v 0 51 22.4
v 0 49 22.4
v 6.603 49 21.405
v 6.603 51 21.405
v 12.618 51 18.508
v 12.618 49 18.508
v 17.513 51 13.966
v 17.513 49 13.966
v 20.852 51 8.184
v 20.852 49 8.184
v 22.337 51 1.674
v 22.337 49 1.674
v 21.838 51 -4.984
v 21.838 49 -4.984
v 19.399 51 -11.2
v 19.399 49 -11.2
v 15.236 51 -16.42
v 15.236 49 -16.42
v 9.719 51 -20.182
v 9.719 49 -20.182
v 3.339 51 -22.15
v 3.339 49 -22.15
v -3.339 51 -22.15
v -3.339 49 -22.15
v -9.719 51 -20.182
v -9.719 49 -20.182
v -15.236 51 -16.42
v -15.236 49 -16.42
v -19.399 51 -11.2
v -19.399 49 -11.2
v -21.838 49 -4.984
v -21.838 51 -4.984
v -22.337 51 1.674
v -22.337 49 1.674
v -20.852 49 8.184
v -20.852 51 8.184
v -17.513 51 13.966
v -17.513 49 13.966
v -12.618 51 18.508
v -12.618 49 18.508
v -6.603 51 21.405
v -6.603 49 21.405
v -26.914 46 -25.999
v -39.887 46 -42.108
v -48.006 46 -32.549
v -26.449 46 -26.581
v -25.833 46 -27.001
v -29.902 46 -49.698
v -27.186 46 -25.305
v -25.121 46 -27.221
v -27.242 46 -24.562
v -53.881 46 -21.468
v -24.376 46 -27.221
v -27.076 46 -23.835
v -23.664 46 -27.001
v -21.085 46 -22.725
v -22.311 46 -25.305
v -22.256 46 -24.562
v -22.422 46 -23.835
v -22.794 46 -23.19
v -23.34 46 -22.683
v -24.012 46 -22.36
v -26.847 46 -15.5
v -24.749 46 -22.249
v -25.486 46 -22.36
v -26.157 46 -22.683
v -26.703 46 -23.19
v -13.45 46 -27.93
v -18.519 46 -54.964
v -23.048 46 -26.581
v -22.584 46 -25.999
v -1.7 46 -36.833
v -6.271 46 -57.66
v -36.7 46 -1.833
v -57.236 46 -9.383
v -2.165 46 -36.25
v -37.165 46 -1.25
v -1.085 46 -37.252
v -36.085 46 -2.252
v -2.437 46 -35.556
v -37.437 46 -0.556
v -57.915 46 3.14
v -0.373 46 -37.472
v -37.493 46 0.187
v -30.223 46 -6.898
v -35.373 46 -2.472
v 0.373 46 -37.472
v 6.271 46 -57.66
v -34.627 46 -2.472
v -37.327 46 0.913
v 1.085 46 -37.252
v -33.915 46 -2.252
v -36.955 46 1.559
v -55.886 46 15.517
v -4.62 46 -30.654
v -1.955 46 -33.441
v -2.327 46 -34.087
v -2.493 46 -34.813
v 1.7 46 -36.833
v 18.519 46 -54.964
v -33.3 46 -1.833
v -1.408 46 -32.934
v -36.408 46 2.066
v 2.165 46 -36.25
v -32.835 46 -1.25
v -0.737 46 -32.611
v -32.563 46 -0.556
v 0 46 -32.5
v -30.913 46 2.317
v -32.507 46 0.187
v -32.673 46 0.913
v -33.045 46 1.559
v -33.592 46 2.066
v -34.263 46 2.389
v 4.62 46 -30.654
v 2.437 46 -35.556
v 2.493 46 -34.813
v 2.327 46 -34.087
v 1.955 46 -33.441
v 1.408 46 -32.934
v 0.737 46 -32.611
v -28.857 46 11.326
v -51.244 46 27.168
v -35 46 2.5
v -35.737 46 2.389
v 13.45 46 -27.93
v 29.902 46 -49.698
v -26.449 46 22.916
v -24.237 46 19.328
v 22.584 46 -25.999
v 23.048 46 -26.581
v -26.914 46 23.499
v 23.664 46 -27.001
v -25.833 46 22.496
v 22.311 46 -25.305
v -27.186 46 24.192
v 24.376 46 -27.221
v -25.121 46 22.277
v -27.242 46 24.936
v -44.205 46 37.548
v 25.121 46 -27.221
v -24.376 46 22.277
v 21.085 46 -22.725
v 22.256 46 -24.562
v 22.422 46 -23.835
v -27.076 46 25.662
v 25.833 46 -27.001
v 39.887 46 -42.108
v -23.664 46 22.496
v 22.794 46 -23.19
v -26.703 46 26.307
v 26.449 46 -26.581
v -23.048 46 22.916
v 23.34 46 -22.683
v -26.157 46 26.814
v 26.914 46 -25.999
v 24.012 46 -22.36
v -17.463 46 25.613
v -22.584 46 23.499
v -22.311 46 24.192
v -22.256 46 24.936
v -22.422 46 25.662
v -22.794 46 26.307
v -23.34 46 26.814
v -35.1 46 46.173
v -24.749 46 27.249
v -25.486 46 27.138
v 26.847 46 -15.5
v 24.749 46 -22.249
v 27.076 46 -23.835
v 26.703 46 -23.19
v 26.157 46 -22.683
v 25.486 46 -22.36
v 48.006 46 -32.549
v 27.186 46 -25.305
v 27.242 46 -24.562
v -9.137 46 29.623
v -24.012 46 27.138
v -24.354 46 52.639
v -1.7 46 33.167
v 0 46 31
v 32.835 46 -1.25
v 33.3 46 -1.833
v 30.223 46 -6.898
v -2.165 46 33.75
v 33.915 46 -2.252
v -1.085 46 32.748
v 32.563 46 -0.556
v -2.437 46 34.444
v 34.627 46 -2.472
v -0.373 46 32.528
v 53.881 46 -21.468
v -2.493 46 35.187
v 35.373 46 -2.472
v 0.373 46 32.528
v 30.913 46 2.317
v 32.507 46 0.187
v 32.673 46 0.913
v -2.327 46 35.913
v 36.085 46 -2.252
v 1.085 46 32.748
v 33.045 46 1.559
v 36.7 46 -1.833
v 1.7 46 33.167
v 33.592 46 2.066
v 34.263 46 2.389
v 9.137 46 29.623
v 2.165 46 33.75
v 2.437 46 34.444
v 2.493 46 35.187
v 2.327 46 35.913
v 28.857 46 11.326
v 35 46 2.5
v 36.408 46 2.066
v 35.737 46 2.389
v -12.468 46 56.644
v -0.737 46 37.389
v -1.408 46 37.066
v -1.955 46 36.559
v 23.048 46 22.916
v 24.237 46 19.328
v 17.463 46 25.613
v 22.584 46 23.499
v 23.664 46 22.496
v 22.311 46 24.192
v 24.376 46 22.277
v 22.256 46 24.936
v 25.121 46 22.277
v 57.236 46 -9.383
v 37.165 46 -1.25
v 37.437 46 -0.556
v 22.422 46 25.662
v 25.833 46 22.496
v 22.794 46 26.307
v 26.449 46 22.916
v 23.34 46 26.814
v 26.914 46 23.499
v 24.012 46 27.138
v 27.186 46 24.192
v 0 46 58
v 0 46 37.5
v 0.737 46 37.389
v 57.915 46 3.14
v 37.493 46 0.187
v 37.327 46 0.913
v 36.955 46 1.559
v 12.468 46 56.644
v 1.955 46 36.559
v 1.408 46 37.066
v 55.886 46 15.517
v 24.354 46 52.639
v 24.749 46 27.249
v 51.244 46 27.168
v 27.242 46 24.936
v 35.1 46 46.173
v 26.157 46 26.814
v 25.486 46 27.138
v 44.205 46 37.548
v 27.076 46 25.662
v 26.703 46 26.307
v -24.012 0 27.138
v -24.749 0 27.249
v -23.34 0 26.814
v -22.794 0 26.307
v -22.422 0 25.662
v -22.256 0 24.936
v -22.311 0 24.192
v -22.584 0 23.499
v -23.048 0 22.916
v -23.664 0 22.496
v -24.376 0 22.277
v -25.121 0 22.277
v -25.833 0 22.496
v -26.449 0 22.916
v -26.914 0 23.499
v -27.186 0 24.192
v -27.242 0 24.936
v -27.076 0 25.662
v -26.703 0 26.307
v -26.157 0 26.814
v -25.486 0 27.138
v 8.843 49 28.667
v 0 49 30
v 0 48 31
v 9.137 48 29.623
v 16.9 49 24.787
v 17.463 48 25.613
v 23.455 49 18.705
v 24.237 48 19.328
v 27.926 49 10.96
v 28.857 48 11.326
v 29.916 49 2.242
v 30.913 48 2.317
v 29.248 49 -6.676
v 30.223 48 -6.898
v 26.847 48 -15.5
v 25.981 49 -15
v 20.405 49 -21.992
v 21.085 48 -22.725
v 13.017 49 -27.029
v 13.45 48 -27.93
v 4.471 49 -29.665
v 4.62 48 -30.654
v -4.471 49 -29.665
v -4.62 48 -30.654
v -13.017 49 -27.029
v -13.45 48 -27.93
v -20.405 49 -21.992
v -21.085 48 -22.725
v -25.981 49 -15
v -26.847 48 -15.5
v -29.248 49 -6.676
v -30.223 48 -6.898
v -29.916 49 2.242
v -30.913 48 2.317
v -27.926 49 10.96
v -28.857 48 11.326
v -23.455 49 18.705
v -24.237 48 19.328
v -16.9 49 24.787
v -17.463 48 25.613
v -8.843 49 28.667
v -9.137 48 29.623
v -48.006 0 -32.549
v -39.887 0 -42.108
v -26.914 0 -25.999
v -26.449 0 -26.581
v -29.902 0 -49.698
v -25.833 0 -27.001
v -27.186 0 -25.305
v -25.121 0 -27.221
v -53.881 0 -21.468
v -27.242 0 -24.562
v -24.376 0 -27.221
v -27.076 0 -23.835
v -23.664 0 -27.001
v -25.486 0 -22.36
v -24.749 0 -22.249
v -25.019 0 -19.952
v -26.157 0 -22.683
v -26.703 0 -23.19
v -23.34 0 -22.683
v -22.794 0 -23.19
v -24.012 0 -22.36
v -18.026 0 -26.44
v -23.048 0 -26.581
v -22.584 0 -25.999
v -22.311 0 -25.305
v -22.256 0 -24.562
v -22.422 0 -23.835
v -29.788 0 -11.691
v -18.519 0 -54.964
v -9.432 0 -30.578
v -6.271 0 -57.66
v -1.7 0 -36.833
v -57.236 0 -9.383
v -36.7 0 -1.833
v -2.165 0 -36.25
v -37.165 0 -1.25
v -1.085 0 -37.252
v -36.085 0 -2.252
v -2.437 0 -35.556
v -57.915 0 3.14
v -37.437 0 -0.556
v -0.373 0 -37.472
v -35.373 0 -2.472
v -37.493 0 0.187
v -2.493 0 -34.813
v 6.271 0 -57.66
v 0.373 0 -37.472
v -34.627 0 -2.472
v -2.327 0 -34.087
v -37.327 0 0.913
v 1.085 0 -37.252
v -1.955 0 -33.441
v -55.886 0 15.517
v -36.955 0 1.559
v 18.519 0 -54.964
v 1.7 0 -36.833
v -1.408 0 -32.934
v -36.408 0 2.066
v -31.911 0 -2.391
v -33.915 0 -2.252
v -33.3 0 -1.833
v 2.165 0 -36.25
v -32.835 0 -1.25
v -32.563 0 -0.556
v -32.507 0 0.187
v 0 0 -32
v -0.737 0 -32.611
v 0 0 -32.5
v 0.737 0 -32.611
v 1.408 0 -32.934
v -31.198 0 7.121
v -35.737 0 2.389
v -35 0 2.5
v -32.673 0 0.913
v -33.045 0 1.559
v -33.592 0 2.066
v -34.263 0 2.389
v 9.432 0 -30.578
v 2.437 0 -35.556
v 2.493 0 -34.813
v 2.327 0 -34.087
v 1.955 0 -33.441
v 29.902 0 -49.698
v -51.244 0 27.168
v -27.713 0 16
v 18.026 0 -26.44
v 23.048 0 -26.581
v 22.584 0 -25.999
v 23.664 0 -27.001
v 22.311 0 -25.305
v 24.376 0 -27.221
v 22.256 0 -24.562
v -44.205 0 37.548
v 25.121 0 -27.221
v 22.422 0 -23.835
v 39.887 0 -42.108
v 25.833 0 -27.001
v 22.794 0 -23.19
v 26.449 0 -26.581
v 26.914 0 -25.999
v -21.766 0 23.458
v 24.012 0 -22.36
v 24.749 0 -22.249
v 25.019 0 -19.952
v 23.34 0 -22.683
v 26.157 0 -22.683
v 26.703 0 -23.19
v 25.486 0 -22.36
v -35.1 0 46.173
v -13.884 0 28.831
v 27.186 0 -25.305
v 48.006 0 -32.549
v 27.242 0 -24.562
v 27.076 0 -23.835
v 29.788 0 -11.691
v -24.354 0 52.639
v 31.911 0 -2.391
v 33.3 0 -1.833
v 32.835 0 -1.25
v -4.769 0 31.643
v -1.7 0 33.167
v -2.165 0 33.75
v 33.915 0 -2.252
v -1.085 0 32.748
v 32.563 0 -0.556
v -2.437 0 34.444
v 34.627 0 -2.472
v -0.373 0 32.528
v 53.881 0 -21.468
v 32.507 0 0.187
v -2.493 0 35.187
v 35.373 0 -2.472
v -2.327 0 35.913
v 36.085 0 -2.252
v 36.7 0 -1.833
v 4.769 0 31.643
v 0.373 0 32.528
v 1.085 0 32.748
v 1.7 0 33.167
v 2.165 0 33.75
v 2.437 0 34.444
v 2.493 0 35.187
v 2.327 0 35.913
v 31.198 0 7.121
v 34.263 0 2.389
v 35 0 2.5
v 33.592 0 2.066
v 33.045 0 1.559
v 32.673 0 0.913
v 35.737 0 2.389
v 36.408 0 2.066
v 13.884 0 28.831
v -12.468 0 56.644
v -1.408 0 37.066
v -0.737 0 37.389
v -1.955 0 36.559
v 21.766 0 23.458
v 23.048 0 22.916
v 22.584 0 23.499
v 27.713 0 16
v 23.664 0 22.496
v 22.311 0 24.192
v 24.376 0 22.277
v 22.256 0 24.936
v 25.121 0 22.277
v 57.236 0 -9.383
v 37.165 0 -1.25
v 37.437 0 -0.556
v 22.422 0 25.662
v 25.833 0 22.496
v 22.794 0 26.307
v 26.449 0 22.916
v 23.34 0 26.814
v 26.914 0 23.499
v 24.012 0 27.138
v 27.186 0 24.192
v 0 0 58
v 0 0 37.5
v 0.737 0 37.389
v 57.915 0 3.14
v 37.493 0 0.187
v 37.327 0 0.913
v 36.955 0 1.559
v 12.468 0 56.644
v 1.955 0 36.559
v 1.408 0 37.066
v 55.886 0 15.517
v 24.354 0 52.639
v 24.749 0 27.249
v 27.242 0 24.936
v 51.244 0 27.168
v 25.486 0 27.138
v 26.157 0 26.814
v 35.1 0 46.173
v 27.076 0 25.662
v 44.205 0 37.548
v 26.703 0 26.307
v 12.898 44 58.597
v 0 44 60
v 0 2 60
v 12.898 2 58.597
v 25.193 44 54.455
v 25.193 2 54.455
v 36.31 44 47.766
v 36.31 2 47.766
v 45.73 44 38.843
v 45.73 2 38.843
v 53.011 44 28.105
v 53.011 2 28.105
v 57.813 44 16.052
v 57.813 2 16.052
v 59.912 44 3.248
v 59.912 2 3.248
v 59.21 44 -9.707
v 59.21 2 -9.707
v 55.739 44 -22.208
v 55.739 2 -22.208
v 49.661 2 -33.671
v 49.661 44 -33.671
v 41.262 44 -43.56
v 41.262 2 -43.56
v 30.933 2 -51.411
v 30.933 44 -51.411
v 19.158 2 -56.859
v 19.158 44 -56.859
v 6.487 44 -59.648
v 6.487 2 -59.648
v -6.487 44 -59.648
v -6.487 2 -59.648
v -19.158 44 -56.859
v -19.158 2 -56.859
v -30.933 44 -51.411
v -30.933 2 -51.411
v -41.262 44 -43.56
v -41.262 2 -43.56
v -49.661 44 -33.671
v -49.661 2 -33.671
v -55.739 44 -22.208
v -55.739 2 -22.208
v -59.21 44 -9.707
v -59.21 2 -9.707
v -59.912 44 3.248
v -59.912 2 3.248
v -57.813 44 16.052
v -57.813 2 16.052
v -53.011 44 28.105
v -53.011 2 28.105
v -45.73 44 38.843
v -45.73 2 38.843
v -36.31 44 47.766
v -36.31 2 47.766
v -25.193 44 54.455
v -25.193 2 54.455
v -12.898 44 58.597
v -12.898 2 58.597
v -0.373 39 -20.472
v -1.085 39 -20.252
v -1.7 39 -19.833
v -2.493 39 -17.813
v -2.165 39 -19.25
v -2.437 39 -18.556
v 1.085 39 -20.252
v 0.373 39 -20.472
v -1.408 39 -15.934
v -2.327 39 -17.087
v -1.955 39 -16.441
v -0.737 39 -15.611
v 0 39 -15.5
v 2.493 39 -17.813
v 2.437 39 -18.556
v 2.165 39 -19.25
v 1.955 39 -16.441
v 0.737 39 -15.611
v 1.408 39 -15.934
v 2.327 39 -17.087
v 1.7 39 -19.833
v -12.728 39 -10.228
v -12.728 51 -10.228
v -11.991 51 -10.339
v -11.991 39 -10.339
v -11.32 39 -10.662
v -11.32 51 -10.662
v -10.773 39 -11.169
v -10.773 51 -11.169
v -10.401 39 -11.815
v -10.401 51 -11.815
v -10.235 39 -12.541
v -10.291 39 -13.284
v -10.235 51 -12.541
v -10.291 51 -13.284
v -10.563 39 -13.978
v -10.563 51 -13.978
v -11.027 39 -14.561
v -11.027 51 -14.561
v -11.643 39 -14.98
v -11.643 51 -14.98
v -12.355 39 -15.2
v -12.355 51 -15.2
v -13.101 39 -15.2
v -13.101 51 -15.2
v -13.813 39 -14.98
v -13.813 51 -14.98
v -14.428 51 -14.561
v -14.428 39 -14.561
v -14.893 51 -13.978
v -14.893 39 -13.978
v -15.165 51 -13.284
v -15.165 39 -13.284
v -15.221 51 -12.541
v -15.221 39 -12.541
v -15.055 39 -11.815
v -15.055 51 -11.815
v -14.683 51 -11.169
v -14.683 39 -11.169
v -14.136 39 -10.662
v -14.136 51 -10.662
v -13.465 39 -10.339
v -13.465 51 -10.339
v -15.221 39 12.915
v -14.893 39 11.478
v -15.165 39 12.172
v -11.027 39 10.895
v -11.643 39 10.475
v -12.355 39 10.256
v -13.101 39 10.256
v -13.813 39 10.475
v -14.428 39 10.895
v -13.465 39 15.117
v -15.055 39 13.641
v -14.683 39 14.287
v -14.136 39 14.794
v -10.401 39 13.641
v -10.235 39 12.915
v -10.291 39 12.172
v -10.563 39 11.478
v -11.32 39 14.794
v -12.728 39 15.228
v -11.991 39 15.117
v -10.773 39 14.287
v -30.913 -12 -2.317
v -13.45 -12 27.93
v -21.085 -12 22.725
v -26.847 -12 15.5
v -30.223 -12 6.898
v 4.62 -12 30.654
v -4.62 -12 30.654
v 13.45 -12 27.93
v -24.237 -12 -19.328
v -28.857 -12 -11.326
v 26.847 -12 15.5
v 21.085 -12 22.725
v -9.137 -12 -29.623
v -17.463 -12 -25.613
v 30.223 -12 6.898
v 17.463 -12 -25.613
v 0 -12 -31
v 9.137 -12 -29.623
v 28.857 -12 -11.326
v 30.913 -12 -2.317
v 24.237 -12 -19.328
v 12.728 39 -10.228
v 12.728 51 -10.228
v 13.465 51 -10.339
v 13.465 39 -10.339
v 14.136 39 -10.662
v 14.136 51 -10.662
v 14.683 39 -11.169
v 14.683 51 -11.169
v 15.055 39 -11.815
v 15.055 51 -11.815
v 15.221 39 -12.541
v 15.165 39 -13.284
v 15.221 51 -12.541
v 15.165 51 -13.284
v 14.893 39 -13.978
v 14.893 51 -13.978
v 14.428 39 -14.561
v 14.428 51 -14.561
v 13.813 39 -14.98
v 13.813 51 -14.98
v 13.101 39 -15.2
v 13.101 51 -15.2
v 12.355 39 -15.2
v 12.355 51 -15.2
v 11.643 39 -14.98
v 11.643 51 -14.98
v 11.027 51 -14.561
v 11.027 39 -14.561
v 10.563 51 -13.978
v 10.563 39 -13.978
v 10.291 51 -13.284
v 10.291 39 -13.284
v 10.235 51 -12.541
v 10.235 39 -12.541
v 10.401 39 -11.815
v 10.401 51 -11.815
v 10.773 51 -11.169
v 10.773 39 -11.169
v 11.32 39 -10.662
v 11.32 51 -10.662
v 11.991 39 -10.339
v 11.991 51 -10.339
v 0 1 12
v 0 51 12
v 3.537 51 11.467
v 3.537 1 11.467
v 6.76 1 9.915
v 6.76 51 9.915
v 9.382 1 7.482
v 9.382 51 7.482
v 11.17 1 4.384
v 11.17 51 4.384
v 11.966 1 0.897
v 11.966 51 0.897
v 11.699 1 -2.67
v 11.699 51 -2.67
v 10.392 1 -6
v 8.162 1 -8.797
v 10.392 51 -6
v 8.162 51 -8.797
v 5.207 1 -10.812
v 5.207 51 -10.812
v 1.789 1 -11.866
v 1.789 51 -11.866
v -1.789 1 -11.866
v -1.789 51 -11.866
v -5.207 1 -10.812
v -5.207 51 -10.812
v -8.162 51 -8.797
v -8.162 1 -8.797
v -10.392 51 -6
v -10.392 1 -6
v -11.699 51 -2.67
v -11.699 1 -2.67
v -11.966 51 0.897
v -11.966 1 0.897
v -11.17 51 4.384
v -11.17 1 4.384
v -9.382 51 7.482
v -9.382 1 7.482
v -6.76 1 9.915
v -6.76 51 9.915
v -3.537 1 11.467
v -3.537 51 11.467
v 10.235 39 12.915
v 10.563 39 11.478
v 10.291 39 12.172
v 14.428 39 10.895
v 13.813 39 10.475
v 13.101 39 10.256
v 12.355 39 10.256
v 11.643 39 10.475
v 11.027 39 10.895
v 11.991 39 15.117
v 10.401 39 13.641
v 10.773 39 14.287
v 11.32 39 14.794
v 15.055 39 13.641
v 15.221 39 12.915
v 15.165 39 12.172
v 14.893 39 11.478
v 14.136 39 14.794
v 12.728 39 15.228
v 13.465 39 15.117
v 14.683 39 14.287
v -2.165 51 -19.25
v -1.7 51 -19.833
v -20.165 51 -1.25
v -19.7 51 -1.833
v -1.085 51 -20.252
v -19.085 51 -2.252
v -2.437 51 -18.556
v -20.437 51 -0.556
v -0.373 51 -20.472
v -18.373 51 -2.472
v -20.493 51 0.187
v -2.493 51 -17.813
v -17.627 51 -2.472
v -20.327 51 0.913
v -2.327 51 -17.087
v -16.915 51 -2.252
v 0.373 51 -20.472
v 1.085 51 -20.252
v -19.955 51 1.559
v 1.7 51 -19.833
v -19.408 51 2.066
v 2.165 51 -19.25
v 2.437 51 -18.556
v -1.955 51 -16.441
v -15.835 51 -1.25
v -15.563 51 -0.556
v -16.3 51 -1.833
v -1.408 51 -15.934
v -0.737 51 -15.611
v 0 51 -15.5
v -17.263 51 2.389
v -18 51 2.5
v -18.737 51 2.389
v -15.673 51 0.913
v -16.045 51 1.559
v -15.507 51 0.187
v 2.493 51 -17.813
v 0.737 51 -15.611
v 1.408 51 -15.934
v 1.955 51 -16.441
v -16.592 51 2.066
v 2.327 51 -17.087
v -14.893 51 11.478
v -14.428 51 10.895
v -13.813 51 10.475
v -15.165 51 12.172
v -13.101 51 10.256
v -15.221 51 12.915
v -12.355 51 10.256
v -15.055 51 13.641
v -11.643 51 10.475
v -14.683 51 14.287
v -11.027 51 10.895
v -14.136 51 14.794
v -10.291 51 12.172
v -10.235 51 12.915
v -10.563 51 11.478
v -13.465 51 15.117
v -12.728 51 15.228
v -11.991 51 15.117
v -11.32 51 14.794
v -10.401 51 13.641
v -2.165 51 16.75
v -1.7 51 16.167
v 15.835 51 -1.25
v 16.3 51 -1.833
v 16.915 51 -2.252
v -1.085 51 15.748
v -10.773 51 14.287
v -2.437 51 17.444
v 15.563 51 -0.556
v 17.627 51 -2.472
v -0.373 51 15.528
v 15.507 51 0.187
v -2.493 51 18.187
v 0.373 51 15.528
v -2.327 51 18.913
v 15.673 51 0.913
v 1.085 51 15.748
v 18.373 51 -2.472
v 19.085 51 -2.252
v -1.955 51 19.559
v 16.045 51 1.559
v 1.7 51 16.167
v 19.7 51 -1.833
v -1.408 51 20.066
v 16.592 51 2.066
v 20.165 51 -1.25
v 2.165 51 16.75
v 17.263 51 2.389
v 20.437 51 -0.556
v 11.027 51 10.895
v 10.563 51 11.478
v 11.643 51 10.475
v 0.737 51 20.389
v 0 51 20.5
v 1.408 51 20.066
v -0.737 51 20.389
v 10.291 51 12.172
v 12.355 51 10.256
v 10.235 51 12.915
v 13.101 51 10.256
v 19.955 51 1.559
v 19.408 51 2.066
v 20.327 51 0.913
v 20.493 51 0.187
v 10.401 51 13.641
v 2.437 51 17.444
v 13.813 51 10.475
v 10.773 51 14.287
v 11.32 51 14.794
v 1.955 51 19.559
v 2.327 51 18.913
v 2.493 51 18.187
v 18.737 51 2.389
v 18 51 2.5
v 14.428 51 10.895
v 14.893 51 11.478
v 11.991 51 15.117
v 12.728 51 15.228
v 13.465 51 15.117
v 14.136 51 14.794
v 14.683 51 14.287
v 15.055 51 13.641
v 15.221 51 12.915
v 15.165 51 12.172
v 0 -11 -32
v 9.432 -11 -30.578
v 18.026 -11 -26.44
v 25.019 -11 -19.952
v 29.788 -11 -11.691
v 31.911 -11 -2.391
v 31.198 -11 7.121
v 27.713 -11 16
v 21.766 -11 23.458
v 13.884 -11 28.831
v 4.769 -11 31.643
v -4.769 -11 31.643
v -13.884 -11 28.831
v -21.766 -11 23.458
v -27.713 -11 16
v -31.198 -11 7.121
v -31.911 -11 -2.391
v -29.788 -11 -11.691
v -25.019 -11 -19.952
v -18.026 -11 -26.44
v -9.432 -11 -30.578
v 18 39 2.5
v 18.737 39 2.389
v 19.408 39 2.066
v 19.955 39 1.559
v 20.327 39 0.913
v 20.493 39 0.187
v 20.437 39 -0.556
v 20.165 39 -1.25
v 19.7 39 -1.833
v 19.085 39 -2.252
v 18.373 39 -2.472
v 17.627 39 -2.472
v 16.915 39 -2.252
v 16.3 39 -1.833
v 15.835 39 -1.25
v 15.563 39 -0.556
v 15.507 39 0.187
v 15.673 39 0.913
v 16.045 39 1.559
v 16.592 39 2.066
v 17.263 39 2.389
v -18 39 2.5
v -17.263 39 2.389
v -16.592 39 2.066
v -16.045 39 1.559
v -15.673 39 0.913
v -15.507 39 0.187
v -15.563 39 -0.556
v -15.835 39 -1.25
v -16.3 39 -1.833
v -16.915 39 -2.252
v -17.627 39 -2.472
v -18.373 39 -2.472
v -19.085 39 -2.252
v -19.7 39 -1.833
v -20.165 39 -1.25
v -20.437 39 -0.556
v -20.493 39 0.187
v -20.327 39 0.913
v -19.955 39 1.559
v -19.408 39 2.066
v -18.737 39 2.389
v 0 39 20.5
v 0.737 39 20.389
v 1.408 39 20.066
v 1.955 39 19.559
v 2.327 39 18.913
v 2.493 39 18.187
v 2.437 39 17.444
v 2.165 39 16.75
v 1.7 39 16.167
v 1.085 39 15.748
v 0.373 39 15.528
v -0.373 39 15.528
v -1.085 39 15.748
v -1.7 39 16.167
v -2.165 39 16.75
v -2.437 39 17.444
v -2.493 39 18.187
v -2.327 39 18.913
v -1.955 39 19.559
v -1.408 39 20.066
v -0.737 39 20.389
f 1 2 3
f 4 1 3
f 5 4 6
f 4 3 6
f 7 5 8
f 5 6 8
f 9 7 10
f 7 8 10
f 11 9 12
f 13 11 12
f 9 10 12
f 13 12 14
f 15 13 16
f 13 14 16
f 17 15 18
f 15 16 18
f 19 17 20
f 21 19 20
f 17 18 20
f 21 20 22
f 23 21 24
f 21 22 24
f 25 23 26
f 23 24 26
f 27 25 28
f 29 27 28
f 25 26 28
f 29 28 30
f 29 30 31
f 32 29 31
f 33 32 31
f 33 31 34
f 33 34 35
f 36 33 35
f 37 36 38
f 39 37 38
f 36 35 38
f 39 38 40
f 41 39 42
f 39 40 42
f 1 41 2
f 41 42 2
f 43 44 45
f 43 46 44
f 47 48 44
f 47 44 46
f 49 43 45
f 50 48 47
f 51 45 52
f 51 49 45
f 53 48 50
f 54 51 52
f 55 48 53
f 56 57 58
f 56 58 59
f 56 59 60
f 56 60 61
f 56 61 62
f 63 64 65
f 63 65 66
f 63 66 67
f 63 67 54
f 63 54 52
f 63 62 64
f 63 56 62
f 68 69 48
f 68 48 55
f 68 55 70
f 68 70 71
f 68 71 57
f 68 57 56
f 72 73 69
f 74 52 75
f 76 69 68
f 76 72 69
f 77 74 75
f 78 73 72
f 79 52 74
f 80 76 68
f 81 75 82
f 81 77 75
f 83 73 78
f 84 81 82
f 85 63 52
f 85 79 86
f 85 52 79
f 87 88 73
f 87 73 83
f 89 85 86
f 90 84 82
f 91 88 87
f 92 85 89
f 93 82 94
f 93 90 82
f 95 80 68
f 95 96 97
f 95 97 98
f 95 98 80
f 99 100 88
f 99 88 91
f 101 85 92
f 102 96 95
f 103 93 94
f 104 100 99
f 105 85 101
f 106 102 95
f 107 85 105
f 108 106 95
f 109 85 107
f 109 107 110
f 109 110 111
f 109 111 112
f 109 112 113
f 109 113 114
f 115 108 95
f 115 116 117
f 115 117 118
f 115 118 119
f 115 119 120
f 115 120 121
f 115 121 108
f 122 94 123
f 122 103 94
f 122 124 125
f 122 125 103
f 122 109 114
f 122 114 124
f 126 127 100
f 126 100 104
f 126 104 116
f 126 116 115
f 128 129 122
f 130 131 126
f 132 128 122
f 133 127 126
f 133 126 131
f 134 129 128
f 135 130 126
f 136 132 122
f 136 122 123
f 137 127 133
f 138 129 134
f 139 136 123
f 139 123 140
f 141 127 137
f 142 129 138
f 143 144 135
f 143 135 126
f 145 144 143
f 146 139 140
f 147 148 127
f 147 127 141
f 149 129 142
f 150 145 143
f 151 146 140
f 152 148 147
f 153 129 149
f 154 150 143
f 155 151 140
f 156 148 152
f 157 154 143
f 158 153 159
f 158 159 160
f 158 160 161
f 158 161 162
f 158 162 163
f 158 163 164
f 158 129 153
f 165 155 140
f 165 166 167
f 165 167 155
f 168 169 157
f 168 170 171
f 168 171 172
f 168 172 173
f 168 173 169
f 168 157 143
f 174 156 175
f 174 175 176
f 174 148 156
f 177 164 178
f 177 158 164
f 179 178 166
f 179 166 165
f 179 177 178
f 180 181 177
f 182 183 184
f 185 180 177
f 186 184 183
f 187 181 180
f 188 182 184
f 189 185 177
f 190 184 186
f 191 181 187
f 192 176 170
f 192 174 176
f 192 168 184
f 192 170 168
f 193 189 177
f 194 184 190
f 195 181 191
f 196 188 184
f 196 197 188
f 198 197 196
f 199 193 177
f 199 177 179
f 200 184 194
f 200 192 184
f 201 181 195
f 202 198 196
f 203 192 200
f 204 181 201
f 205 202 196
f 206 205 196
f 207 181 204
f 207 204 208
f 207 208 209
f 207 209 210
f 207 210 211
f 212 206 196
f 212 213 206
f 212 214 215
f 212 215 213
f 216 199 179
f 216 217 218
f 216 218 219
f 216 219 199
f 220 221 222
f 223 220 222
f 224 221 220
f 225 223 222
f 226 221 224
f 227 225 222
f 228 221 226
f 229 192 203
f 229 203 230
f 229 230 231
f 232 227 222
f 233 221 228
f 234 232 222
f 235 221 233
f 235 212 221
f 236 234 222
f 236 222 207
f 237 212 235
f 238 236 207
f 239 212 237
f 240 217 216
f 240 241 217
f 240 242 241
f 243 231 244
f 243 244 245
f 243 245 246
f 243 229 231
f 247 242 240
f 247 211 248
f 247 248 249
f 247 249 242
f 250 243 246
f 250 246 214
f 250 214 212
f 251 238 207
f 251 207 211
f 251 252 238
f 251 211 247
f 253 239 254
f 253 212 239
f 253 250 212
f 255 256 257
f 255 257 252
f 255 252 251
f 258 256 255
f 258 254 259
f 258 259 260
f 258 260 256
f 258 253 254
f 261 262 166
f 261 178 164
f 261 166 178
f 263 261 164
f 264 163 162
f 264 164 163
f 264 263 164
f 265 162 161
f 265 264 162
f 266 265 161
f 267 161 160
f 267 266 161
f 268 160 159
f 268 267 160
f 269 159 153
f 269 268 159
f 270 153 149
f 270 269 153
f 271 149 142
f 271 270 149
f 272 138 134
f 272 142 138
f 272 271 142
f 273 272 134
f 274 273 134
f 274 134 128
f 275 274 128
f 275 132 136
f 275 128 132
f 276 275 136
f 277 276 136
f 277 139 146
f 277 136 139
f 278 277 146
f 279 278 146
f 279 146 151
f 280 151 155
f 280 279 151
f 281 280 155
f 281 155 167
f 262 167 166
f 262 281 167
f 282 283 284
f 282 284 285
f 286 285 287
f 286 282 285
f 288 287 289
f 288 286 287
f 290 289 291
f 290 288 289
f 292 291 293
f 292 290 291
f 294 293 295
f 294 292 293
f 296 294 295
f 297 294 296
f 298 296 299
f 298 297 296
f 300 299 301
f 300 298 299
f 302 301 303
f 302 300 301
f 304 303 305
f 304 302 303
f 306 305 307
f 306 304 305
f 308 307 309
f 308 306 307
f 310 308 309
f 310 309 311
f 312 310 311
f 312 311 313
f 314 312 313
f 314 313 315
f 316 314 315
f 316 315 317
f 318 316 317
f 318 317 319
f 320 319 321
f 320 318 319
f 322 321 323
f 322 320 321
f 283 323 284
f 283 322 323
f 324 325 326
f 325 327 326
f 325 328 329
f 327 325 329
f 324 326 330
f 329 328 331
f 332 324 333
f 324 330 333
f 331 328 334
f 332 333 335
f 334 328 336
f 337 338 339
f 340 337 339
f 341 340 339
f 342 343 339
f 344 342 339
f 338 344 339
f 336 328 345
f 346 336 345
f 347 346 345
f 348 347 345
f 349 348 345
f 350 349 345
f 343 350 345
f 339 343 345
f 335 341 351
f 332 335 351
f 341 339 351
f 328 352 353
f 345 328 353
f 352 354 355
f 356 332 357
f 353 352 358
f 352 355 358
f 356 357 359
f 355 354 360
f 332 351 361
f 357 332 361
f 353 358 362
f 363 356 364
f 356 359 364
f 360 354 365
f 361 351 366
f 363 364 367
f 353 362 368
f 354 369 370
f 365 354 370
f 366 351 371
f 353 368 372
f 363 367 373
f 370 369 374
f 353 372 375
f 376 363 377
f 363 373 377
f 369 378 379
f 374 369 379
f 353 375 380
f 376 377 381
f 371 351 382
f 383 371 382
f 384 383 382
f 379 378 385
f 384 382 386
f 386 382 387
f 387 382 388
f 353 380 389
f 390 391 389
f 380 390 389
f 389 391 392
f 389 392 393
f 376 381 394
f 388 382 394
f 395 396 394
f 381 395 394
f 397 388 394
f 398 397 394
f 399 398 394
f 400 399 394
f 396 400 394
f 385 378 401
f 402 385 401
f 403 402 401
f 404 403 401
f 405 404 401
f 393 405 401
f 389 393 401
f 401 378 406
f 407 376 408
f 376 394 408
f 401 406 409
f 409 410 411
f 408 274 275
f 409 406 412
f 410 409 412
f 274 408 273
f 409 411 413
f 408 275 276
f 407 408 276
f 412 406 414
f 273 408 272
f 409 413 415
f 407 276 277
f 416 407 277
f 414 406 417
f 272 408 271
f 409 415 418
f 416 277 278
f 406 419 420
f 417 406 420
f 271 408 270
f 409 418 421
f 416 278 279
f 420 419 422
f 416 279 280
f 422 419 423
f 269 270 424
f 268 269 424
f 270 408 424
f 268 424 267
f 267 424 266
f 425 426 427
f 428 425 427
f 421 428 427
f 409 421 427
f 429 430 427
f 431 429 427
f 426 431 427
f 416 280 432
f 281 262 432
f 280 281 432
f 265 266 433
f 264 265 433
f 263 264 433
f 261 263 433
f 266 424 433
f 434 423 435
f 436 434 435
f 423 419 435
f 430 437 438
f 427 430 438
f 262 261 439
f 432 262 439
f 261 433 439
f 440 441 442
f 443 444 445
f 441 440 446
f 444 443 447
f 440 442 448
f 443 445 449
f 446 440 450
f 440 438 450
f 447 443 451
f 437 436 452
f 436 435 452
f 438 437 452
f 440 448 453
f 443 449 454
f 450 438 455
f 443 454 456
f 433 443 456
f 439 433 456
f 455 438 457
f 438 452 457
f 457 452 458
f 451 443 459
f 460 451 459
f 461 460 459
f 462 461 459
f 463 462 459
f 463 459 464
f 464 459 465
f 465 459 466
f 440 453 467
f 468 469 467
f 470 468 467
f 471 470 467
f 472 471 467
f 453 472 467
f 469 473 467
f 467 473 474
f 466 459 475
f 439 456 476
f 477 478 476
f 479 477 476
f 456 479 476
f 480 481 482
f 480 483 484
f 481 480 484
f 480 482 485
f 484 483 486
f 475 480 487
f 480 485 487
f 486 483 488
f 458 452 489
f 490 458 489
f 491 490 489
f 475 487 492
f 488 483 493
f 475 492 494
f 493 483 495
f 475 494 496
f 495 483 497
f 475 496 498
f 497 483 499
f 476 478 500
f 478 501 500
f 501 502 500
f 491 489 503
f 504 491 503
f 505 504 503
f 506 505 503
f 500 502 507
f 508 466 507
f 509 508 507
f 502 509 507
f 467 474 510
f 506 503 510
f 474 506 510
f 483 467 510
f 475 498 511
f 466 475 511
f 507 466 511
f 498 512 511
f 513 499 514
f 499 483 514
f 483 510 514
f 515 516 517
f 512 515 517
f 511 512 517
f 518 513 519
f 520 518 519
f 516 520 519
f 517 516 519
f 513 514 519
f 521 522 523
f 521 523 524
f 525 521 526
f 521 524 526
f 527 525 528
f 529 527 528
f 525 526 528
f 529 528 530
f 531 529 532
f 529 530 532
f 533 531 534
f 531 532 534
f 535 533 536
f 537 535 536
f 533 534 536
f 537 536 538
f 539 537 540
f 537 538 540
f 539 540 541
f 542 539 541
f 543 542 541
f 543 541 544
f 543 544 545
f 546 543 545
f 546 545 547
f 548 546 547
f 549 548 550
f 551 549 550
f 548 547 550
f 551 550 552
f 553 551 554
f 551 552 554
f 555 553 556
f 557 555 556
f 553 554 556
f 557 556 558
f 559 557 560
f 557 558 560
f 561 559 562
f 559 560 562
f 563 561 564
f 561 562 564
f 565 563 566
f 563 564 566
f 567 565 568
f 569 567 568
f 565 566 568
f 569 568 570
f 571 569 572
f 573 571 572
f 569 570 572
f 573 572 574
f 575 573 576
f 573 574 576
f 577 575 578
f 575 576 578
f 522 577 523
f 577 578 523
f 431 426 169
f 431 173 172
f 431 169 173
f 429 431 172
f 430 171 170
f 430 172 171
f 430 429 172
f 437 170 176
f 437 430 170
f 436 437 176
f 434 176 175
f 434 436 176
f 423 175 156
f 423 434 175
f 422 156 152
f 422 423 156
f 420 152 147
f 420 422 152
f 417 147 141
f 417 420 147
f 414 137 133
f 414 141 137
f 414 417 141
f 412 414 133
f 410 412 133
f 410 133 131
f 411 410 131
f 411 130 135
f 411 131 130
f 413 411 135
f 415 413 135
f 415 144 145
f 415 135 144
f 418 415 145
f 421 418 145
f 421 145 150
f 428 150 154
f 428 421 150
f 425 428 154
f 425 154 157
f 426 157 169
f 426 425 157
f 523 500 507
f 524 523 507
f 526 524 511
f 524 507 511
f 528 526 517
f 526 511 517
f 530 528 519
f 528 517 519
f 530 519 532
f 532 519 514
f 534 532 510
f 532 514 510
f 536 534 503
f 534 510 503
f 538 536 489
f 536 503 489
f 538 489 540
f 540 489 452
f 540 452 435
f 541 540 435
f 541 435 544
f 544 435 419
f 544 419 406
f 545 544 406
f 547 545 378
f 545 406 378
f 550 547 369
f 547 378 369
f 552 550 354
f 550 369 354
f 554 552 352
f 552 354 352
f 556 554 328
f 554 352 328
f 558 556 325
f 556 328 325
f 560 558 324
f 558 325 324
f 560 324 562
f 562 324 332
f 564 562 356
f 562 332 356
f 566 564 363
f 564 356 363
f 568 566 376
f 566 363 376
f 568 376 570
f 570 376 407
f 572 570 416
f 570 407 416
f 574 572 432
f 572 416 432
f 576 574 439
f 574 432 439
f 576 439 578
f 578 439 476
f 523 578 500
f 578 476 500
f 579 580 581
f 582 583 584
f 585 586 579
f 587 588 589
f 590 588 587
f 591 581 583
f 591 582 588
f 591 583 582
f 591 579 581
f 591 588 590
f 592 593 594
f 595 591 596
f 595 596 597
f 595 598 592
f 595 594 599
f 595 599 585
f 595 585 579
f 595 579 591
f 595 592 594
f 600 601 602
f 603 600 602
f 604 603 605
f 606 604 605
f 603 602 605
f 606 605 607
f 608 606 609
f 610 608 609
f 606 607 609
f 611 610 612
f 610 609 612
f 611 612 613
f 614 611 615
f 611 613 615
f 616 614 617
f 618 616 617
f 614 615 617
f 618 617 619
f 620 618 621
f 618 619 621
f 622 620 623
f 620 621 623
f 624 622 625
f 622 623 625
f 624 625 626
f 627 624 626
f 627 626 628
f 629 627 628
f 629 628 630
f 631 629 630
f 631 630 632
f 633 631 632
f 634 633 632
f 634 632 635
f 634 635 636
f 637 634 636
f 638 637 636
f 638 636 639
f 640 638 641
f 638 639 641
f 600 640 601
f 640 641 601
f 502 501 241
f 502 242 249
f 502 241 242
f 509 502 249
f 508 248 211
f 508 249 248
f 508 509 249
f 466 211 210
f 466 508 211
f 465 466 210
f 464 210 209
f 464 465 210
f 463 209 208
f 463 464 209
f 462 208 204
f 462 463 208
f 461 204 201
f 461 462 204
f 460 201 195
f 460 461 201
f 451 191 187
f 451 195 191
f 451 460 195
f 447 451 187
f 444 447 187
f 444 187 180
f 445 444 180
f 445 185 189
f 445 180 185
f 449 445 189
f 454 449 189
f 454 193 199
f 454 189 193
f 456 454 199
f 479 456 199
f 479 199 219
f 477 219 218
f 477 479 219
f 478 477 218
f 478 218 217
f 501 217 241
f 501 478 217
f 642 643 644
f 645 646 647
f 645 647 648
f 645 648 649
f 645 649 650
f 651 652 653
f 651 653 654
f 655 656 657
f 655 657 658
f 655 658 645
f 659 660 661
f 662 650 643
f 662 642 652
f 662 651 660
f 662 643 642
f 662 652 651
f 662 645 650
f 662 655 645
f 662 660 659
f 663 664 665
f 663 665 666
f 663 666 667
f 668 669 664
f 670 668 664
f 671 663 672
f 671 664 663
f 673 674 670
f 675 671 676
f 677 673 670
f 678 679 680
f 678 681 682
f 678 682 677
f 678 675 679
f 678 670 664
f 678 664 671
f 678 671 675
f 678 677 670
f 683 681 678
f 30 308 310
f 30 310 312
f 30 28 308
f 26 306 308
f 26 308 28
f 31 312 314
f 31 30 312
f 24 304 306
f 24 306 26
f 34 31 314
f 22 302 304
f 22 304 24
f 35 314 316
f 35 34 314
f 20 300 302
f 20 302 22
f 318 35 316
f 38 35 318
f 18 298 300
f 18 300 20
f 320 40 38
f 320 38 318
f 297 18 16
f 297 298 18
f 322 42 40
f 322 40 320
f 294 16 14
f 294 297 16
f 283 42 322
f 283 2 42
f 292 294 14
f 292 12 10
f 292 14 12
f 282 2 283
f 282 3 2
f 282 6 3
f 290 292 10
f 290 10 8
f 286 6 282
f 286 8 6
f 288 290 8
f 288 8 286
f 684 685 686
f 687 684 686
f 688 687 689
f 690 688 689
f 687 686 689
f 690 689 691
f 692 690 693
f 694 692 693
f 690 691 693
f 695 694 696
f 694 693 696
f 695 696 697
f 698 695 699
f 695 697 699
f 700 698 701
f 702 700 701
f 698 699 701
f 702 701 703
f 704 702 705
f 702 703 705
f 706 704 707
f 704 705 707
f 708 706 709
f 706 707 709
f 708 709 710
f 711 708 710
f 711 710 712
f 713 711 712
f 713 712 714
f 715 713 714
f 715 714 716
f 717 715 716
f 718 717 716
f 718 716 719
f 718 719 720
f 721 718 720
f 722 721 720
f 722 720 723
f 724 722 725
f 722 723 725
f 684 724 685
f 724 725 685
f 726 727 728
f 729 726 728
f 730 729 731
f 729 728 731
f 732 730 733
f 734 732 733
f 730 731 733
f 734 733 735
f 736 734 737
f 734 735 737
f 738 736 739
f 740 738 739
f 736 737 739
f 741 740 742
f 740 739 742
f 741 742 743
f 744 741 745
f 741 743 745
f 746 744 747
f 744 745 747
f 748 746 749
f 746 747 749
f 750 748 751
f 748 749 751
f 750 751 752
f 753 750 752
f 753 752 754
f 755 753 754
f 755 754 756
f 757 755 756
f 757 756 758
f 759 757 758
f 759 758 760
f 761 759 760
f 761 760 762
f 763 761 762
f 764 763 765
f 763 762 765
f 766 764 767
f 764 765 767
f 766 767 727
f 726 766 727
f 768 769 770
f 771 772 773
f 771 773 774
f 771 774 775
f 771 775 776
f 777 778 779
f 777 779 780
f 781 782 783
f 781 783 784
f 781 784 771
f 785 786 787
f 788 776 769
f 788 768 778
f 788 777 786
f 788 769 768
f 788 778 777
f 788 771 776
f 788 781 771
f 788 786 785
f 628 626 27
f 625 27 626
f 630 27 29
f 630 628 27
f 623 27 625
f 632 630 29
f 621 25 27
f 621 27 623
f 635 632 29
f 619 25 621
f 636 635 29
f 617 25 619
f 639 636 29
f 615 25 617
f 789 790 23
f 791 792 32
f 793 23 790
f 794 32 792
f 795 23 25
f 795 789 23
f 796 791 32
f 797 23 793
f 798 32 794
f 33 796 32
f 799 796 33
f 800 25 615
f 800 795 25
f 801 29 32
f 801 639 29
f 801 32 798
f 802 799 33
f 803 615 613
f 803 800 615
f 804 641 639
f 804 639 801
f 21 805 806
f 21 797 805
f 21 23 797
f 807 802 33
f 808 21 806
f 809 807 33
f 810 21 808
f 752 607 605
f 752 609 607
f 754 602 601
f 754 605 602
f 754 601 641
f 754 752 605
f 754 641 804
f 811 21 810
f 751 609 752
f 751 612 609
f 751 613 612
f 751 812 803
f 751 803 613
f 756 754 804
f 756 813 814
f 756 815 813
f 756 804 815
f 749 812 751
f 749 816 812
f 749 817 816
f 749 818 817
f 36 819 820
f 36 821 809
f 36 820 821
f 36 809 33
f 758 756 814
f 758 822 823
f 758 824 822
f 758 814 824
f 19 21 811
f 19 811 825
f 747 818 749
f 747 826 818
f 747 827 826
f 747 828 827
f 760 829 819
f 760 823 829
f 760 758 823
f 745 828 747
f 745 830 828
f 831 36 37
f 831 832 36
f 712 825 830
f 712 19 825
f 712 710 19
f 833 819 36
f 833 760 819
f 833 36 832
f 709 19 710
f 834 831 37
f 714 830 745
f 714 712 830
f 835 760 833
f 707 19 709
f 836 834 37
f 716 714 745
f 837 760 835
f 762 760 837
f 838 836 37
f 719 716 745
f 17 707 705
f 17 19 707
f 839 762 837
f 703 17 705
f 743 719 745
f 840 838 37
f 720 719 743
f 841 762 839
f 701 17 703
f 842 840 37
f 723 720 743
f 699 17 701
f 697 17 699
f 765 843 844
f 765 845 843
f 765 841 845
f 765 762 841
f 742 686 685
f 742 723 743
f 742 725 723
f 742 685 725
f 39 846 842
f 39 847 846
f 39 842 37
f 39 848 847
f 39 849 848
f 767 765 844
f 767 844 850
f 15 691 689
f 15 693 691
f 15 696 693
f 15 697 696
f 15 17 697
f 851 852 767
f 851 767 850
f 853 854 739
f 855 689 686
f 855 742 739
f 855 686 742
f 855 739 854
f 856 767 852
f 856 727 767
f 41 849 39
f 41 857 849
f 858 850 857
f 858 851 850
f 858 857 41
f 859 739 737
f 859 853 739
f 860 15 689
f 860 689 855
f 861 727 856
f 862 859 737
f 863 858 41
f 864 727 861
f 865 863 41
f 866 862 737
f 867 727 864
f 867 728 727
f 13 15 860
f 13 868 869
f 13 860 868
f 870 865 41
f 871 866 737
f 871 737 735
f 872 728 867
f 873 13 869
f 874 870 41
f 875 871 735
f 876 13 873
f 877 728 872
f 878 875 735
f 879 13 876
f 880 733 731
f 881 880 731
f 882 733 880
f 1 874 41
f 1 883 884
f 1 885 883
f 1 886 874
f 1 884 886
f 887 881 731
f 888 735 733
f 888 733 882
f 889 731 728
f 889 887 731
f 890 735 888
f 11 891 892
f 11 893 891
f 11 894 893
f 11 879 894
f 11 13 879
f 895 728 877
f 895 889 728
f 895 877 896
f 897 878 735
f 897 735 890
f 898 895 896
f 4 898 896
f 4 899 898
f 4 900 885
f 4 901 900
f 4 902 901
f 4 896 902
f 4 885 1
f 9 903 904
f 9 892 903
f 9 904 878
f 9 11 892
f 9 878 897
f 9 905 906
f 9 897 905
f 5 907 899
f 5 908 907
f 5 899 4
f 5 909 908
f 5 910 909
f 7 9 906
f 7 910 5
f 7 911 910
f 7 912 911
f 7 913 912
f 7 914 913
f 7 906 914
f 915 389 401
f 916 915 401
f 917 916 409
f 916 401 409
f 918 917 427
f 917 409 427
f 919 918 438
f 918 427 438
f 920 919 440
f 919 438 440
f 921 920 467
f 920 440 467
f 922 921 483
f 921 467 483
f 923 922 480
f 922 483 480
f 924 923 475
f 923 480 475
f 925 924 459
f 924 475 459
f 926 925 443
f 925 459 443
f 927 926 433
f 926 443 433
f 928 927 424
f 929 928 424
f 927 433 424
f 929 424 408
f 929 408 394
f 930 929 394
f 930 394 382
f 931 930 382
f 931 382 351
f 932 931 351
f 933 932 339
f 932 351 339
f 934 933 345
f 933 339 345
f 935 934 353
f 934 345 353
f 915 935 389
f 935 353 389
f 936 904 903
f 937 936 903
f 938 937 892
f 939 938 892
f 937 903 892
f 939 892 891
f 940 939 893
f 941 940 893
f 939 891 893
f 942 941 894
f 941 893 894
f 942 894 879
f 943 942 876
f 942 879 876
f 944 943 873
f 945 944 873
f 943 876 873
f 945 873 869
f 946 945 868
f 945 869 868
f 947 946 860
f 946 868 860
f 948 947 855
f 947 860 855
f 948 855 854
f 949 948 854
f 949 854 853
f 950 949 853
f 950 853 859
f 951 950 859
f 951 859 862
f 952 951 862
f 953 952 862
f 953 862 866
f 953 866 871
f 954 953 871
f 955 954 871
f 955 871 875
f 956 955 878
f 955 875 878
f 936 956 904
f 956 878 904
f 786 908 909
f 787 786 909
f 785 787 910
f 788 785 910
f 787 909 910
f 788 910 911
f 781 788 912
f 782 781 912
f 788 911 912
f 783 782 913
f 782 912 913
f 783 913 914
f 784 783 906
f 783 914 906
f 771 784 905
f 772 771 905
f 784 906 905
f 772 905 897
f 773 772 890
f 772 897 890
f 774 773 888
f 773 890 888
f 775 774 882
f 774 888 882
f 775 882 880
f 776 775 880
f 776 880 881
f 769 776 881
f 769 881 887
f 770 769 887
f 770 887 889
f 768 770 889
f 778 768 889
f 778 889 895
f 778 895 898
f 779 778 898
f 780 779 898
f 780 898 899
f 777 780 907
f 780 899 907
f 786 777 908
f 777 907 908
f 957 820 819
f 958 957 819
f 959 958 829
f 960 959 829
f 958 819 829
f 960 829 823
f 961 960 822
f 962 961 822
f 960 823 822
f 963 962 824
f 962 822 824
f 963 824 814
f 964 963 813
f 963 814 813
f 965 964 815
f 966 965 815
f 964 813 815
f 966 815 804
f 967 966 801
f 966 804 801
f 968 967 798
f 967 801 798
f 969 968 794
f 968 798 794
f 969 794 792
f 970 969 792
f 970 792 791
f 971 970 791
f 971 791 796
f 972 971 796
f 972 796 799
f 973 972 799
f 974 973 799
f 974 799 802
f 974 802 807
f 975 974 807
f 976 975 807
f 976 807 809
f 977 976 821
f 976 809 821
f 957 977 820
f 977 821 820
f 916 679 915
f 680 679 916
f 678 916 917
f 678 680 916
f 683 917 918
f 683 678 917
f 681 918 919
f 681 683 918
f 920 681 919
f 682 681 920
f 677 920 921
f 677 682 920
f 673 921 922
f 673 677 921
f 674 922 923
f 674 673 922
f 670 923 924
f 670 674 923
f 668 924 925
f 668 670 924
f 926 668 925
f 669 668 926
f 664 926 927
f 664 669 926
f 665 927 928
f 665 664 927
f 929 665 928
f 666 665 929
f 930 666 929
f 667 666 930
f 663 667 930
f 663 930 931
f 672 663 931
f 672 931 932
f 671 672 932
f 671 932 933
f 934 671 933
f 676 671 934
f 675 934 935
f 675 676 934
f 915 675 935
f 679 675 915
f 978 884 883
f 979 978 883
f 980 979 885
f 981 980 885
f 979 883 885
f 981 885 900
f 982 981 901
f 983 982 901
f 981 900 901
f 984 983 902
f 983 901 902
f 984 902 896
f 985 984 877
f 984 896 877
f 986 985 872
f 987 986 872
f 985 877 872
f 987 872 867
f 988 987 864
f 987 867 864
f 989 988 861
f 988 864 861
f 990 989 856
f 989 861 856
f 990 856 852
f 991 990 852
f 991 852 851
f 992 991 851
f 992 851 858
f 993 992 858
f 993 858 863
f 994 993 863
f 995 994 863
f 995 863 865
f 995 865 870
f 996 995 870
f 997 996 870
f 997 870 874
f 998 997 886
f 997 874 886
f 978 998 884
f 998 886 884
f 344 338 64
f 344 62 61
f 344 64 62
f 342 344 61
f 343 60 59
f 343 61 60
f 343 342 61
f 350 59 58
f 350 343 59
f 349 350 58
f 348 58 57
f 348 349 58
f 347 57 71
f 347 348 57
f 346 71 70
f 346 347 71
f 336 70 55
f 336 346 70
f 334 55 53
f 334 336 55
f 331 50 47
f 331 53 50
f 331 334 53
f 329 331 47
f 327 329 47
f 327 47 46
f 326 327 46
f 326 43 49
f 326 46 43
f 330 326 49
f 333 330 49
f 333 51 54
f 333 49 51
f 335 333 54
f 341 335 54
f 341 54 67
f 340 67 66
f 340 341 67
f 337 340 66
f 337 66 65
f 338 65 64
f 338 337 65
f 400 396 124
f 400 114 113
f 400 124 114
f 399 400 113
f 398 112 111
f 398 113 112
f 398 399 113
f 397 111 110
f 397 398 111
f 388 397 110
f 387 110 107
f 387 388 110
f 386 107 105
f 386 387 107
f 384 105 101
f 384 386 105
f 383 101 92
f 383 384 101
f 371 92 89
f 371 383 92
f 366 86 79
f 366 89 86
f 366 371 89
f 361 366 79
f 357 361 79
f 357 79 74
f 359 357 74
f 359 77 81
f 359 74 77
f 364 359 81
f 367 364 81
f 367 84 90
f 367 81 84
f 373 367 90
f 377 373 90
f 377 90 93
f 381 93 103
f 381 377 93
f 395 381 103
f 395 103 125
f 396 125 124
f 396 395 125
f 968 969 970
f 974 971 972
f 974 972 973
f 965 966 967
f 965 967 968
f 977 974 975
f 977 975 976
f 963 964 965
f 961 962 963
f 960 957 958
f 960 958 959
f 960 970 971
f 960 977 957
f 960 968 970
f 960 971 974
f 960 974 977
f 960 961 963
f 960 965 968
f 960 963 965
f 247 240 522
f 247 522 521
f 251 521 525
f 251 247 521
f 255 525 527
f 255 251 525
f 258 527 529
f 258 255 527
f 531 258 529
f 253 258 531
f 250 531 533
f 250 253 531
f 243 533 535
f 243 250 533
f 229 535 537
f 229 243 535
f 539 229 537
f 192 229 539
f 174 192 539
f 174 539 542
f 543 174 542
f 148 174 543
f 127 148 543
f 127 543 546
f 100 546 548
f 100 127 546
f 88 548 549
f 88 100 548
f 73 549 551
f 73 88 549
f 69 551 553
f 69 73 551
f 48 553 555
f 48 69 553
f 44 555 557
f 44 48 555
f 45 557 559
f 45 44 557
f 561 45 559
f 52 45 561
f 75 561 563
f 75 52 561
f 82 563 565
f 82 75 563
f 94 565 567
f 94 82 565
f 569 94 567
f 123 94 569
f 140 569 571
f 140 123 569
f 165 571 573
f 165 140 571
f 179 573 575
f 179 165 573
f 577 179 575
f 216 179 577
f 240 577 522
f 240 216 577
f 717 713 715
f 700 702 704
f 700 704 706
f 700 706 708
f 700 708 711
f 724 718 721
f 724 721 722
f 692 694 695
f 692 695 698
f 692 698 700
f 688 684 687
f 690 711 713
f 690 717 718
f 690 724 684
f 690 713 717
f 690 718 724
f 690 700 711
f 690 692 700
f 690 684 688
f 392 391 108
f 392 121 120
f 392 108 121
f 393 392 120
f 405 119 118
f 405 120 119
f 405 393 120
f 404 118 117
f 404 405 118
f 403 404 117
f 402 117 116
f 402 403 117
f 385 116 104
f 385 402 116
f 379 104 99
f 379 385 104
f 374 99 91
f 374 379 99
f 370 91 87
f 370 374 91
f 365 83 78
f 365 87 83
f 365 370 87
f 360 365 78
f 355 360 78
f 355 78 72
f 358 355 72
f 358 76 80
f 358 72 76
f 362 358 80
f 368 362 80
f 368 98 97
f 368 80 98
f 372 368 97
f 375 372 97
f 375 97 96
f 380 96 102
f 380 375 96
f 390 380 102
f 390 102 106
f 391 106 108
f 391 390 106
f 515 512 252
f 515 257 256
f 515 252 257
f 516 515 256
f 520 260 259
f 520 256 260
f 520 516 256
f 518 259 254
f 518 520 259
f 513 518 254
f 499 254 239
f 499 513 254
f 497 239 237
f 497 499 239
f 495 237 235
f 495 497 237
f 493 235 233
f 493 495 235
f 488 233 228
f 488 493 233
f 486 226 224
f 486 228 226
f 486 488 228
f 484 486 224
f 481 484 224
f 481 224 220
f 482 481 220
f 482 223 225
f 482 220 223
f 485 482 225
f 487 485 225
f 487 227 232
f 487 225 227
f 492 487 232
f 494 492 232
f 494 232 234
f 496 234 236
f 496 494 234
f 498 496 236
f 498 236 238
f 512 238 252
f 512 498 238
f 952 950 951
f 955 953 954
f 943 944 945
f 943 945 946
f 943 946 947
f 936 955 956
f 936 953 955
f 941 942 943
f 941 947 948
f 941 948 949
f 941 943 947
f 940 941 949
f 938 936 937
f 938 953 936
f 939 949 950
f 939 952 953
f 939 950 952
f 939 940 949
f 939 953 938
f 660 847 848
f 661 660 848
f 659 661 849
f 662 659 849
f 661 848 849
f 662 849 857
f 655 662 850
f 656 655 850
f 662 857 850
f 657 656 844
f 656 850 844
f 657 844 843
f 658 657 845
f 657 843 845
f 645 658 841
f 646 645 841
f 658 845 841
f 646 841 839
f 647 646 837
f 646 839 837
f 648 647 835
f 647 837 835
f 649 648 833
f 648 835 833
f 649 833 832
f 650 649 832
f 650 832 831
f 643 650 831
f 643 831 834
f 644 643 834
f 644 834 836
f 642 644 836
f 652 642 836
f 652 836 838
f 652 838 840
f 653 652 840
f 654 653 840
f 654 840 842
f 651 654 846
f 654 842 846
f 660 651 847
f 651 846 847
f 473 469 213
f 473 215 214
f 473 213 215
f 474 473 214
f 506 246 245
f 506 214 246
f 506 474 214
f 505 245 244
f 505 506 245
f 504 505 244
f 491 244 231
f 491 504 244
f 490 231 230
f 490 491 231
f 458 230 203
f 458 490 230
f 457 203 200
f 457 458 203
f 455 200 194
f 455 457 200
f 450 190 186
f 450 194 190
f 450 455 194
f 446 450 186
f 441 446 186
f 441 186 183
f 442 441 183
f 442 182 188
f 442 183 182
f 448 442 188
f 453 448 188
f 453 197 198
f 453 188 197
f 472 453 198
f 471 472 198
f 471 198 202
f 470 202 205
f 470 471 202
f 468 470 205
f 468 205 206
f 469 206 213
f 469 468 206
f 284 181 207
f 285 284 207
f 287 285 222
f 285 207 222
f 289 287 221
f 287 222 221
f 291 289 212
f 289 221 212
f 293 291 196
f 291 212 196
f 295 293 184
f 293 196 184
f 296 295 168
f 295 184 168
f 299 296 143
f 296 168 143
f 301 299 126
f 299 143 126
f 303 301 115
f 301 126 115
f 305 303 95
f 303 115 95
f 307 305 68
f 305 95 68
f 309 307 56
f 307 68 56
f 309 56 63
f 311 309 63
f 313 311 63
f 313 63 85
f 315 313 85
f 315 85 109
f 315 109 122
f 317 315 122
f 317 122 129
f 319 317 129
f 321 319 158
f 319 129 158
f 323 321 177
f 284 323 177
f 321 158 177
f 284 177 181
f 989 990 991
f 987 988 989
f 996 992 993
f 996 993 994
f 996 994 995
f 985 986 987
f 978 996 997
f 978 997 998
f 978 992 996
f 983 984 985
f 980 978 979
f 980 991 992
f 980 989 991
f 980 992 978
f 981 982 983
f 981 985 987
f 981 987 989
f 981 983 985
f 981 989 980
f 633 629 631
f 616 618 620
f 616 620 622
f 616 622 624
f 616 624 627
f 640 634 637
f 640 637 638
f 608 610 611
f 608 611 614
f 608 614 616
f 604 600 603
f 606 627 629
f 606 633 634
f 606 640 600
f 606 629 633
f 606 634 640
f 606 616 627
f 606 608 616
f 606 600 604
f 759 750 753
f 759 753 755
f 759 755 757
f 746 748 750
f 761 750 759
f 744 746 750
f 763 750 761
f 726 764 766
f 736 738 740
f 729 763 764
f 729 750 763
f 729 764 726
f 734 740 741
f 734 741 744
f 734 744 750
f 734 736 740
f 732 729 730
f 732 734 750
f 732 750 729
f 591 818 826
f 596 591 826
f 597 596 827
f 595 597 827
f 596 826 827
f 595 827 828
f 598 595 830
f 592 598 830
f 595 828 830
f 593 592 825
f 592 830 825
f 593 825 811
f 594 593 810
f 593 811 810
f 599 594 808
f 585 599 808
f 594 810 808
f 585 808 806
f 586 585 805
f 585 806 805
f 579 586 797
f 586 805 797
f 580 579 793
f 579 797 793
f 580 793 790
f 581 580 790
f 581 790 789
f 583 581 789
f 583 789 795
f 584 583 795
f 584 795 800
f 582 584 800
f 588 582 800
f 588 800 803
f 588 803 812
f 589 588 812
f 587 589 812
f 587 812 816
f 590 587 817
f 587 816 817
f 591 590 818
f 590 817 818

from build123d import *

# Parameters (mm, degrees)
SKETCH1_R               = 60
BOSS_EXTRUDE1_DEPTH     = 46
SKETCH2_R               = 32
BOSS_EXTRUDE2_DEPTH     = 12
SKETCH3_R               = 31
BOSS_EXTRUDE3_DEPTH     = 3
SKETCH4_R               = 22.4
BOSS_EXTRUDE4_DEPTH     = 2
SKETCH6_R               = 12
CUT_EXTRUDE1_DEPTH      = 50
SKETCH8_R               = 2.5
CUT_EXTRUDE2_DEPTH      = 12
CUT_EXTRUDE3_DEPTH      = 103.78132126
CUT_EXTRUDE3_DEPTH_BACK = 103.78132126
SKETCH9_R               = 2.5
CHAMFER1_SIZE           = 2
CHAMFER2_SIZE           = 1


with BuildPart() as part:
    # Sketch1 → Boss-Extrude1 (new body)
    with BuildSketch(Plane(origin=(0, 0, 0), x_dir=(1, 0, 0), z_dir=(0, 1, 0))):
        Circle(SKETCH1_R)
    extrude(amount=BOSS_EXTRUDE1_DEPTH)

    # Sketch2 → Boss-Extrude2 (add)
    with BuildSketch(Plane.XZ):
        Circle(SKETCH2_R)
    extrude(amount=BOSS_EXTRUDE2_DEPTH)

    # Sketch3 → Boss-Extrude3 (add)
    with BuildSketch(Plane(origin=(0, 46, 0), x_dir=(1, 0, 0), z_dir=(0, 1, 0))):
        Circle(SKETCH3_R)
    extrude(amount=BOSS_EXTRUDE3_DEPTH)

    # Sketch4 → Boss-Extrude4 (add)
    with BuildSketch(Plane(origin=(0, 49, 0), x_dir=(1, 0, 0), z_dir=(0, 1, 0))):
        Circle(SKETCH4_R)
    extrude(amount=BOSS_EXTRUDE4_DEPTH)

    # Sketch6 → Cut-Extrude1 (cut)
    with BuildSketch(Plane(origin=(0, 51, 0), x_dir=(1, 0, 0), z_dir=(0, 1, 0))):
        Circle(SKETCH6_R)
    extrude(amount=-CUT_EXTRUDE1_DEPTH, mode=Mode.SUBTRACT)

    # Sketch8 → Cut-Extrude2 (cut)
    with BuildSketch(Plane(origin=(0, 51, 0), x_dir=(1, 0, 0), z_dir=(0, 1, 0))):
        with Locations((0, 18)):
            Circle(SKETCH8_R)
        with Locations((12.727922061, 12.727922061)):
            Circle(SKETCH8_R)
        with Locations((18, 0)):
            Circle(SKETCH8_R)
        with Locations((12.727922061, -12.727922061)):
            Circle(SKETCH8_R)
        with Locations((0, -18)):
            Circle(SKETCH8_R)
        with Locations((-12.727922061, -12.727922061)):
            Circle(SKETCH8_R)
        with Locations((-18, 0)):
            Circle(SKETCH8_R)
        with Locations((-12.727922061, 12.727922061)):
            Circle(SKETCH8_R)
    extrude(amount=-CUT_EXTRUDE2_DEPTH, mode=Mode.SUBTRACT)

    # Sketch9 → Cut-Extrude3 (cut, two sides: drawn at the far end of the back side and taken through both)
    with BuildSketch(Plane(origin=(0, 46, 0), x_dir=(1, 0, 0), z_dir=(0, 1, 0)).offset(-CUT_EXTRUDE3_DEPTH_BACK)):
        with Locations((0, 35)):
            Circle(SKETCH9_R)
        with Locations((24.748737342, 24.748737342)):
            Circle(SKETCH9_R)
        with Locations((35, 0)):
            Circle(SKETCH9_R)
        with Locations((24.748737342, -24.748737342)):
            Circle(SKETCH9_R)
        with Locations((0, -35)):
            Circle(SKETCH9_R)
        with Locations((-24.748737342, -24.748737342)):
            Circle(SKETCH9_R)
        with Locations((-35, 0)):
            Circle(SKETCH9_R)
        with Locations((-24.748737342, 24.748737342)):
            Circle(SKETCH9_R)
    extrude(amount=CUT_EXTRUDE3_DEPTH + CUT_EXTRUDE3_DEPTH_BACK, mode=Mode.SUBTRACT)

    # Chamfer1
    chamfer1_edges = [part.edges().sort_by_distance(p)[0] for p in [
        (-60, 0, 0),
        (-60, 46, 0),
    ]]
    chamfer(chamfer1_edges, length=CHAMFER1_SIZE)

    # Chamfer2
    chamfer2_edges = [part.edges().sort_by_distance(p)[0] for p in [
        (-31, 49, 0),
        (-32, -12, 0),
    ]]
    chamfer(chamfer2_edges, length=CHAMFER2_SIZE)


solid = part.part
